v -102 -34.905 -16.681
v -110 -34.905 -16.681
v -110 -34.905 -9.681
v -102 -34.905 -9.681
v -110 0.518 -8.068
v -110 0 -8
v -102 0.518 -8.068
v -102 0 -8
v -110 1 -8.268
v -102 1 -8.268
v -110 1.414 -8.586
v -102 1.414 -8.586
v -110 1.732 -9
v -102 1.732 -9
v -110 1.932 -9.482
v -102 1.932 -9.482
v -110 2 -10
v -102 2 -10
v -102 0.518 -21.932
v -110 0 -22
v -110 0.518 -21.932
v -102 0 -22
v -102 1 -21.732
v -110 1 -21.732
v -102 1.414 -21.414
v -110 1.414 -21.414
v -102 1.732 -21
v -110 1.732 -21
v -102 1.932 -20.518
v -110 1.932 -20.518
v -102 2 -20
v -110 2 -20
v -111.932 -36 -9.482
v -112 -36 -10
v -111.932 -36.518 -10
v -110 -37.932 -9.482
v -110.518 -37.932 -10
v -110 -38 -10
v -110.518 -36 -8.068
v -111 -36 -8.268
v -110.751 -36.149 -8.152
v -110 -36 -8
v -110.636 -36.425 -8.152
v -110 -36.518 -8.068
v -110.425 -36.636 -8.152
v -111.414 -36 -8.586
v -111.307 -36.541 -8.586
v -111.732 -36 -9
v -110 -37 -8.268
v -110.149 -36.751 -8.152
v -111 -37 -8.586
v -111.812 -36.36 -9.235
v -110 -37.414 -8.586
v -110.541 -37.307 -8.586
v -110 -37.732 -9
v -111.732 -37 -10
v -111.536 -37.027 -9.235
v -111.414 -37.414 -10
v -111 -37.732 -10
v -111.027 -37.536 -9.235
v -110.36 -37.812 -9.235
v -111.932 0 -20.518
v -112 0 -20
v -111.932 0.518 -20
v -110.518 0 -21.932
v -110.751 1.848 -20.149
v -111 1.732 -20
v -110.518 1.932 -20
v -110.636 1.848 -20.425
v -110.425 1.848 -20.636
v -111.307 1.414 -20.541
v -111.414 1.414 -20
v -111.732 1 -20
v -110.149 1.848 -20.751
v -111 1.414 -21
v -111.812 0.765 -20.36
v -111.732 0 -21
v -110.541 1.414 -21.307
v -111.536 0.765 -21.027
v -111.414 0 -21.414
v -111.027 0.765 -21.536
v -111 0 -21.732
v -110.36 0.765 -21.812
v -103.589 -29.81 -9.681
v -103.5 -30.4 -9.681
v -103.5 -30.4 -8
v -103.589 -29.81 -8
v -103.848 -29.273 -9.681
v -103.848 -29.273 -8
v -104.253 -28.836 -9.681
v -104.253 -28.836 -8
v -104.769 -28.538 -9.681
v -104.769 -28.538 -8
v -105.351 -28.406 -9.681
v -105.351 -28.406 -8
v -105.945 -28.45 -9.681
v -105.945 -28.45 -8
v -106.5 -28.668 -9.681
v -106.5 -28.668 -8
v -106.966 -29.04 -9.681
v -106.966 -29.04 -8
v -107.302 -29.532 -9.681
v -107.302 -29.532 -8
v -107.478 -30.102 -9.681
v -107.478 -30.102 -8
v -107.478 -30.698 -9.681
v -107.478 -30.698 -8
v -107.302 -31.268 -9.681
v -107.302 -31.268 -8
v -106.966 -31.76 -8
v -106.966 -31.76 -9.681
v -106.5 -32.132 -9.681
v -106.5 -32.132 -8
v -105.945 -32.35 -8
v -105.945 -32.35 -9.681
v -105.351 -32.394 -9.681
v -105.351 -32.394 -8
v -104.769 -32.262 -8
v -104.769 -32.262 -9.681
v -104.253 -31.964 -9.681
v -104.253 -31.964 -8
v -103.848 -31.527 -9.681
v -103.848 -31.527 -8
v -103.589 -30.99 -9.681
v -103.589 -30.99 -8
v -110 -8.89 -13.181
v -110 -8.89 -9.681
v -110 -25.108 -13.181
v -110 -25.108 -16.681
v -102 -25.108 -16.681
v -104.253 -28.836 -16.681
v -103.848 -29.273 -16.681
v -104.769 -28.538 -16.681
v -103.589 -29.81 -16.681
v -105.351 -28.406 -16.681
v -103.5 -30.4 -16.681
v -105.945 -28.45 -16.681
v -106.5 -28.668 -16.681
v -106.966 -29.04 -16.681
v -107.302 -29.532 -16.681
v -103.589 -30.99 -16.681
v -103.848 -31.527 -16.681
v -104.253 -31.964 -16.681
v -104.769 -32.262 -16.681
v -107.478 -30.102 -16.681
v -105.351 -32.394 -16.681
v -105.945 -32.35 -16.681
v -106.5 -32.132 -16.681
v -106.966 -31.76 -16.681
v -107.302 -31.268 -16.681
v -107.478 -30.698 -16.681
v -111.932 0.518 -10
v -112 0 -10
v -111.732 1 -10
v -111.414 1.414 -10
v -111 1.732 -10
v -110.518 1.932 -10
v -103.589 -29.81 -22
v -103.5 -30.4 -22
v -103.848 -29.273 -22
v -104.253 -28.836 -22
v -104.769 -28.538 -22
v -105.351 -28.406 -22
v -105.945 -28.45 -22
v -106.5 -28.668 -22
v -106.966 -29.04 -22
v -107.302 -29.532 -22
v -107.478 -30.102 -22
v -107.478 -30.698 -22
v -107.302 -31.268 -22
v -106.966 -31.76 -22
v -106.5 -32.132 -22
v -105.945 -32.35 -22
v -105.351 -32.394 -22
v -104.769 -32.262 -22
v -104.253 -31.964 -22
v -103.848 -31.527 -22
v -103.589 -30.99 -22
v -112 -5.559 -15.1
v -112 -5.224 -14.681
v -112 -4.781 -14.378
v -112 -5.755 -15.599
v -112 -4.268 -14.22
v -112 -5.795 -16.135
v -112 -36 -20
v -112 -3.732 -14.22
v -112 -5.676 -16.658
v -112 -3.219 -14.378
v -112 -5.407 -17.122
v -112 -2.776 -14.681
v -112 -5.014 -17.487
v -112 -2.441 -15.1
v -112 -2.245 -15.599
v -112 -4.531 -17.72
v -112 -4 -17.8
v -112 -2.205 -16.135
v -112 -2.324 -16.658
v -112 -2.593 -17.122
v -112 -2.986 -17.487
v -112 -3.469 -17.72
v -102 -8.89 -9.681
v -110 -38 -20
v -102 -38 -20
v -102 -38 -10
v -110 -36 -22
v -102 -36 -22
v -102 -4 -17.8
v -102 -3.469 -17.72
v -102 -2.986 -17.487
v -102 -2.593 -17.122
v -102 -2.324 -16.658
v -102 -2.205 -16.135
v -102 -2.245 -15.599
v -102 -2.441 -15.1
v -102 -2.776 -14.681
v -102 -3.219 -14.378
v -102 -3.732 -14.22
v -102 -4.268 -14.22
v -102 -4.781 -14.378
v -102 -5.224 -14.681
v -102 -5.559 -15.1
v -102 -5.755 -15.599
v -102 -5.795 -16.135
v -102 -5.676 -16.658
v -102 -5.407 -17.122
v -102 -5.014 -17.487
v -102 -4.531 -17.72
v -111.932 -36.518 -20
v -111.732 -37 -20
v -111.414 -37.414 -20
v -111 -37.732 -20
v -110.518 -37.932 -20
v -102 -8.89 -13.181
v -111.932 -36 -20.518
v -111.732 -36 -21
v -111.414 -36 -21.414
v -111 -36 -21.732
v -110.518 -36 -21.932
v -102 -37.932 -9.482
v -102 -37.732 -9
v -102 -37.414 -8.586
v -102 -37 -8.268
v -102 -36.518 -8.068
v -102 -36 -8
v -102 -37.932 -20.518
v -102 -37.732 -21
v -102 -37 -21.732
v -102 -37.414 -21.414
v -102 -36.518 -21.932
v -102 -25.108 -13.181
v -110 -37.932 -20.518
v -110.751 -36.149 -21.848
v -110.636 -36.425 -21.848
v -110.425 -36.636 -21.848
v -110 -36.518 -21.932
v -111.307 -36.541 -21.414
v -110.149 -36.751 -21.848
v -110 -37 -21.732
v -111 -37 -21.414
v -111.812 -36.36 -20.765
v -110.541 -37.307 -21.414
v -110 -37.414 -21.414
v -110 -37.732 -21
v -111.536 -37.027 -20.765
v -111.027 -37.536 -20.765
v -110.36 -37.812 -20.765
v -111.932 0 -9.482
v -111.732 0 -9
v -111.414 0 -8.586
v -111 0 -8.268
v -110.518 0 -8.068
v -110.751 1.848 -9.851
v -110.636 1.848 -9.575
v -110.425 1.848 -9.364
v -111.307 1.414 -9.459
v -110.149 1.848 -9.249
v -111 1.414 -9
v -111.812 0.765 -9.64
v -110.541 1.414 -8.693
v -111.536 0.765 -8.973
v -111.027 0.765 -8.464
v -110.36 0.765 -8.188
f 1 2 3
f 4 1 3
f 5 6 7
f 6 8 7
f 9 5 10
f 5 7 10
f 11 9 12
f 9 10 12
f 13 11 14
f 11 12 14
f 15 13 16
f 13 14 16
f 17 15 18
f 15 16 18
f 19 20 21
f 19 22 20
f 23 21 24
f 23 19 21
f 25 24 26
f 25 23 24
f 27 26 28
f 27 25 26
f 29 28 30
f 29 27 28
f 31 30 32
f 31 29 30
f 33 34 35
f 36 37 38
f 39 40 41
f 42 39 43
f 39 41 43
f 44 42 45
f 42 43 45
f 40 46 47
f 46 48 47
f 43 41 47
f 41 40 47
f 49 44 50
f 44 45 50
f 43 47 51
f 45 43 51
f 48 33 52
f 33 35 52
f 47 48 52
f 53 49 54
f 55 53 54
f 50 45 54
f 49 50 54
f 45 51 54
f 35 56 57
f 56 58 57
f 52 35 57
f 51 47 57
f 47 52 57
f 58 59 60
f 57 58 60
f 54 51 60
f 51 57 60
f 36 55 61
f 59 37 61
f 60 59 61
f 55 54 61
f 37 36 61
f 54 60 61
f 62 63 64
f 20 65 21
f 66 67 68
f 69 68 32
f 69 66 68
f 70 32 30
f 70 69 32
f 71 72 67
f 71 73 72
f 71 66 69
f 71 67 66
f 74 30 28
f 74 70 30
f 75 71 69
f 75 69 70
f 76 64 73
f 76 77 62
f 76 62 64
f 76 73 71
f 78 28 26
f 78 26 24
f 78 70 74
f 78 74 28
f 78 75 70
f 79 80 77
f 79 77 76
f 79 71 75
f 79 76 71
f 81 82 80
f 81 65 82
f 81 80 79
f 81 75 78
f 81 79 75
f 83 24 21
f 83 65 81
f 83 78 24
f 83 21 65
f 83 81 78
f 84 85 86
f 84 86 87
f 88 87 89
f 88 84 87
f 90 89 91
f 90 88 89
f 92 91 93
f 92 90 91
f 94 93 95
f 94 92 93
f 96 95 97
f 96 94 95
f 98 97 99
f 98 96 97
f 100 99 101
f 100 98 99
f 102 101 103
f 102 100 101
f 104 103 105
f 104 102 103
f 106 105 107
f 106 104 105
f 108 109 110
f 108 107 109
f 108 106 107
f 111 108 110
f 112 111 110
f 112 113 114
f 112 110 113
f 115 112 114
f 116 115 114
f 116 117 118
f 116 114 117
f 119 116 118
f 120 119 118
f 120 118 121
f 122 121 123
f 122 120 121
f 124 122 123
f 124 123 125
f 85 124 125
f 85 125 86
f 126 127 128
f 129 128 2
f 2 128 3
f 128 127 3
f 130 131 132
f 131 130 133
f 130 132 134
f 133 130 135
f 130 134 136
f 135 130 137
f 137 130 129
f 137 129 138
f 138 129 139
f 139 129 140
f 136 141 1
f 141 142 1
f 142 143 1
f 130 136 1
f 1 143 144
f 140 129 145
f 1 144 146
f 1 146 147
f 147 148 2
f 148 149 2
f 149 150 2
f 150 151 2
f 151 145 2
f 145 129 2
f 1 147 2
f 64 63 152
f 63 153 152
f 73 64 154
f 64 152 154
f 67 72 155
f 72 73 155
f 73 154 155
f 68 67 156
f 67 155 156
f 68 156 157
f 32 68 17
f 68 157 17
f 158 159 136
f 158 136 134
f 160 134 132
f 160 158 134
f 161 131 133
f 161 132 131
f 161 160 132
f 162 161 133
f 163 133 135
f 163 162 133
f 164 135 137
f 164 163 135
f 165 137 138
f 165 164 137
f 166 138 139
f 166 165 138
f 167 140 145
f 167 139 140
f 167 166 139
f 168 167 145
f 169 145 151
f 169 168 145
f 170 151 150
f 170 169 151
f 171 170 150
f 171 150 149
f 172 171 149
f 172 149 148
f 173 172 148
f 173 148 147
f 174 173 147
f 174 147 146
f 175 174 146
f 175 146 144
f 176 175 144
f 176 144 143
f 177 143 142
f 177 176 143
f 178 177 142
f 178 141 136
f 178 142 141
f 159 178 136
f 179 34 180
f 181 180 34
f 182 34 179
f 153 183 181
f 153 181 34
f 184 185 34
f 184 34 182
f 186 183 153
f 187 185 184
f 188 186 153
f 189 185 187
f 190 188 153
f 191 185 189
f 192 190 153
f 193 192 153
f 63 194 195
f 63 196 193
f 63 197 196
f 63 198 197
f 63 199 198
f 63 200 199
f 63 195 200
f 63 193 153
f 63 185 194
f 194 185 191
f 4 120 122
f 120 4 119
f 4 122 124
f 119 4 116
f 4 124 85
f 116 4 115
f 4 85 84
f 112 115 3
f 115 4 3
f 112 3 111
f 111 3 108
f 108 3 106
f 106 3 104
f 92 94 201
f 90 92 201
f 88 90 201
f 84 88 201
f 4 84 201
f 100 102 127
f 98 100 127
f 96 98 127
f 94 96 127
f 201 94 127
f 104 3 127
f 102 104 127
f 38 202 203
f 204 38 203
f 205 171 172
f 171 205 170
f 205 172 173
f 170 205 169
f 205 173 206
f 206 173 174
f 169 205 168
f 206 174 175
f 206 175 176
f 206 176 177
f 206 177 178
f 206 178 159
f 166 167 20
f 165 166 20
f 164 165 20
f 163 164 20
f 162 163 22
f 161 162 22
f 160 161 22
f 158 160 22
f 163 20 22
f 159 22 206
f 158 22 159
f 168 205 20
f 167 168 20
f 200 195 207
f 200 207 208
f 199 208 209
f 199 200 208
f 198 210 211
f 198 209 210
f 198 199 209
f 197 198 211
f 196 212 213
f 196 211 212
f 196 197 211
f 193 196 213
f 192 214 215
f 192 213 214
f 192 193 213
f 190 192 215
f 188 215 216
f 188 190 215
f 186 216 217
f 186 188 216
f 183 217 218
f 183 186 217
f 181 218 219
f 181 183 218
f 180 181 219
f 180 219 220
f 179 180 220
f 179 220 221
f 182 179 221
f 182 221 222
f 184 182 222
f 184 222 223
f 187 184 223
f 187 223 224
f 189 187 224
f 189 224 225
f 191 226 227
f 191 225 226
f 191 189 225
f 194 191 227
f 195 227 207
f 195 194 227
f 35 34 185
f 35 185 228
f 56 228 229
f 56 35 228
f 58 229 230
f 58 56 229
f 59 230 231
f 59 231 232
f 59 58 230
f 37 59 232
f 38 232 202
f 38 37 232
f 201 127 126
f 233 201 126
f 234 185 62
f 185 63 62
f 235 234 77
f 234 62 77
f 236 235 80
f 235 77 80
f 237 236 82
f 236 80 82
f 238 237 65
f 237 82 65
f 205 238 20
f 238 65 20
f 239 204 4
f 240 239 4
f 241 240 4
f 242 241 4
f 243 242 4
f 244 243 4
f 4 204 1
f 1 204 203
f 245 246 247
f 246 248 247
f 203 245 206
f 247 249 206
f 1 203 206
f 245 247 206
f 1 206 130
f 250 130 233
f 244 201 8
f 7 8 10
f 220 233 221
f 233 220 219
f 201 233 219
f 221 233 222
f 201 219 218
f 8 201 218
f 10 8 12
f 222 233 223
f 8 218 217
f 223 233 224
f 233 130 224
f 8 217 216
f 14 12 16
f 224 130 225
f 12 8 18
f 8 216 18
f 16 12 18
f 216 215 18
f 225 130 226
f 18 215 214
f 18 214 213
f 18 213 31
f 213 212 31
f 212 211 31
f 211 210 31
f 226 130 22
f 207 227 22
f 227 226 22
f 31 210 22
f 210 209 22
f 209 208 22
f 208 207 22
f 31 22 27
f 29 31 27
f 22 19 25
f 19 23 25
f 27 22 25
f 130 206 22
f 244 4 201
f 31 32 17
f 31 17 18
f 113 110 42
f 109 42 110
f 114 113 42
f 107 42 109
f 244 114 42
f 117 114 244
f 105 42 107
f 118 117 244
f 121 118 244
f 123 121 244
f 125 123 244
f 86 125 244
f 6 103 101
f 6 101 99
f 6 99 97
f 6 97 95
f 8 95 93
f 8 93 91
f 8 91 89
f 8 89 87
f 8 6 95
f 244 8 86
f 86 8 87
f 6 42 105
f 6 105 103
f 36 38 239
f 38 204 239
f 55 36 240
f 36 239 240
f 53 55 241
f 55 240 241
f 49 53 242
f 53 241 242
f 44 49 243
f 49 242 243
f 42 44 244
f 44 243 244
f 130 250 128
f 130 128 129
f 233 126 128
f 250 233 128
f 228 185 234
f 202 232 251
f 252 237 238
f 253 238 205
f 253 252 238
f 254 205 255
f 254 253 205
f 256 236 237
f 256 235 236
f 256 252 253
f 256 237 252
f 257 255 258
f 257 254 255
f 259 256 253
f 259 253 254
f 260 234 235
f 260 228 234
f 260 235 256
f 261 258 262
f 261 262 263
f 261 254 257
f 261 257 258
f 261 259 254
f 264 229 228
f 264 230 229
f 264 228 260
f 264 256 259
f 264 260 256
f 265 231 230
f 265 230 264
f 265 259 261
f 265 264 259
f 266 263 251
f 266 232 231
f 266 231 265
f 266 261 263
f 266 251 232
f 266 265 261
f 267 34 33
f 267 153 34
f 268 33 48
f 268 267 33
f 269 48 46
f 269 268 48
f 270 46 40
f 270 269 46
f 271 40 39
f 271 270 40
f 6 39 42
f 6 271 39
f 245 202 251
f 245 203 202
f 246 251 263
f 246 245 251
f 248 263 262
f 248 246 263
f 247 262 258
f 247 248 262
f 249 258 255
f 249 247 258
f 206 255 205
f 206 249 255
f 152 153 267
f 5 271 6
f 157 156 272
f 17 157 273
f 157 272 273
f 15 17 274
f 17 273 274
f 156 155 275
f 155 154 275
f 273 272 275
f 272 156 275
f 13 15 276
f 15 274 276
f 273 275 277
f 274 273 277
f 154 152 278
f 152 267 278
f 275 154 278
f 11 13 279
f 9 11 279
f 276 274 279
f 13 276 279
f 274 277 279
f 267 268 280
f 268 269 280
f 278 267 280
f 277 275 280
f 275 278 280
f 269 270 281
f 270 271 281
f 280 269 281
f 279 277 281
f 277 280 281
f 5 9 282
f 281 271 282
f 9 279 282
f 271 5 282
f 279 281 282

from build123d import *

# Parameters (mm, degrees)
CYLINDER009_R     = 2
CYLINDER009_DEPTH = 50
PAD001_DEPTH      = 30
CYLINDER008_R     = 1.8
CYLINDER008_DEPTH = 50
BOX006_W          = 10
BOX006_H          = 40
BOX006_DEPTH      = 14
FILLET_R          = 2


with BuildPart() as cylinder009:
    # Cylinder009 → Cylinder009 (new body)
    with BuildSketch(Plane(origin=(-105.5, -30.4, -37), x_dir=(1, 0, 0), z_dir=(0, 0, 1))):
        Circle(CYLINDER009_R)
    extrude(amount=CYLINDER009_DEPTH)


with BuildPart() as body001:
    # Sketch001 → Pad001 (new body)
    with BuildSketch(Plane.YZ):
        Polygon((-34.905251, -9.681131), (-8.889799, -9.681131), (-8.889799, -13.181131), (-25.107943, -13.181131), (-25.107943, -16.681131), (-34.905251, -16.681131), align=None)
    extrude(amount=PAD001_DEPTH)


with BuildPart() as body001_1:
    # Body001 placement: moved
    add(body001.part.moved(Location((-110, 0, 0))))


with BuildPart() as fusion001005:
    # Cylinder008 → Cylinder008 (new body)
    with BuildSketch(Plane(origin=(-143, -4, -16), x_dir=(0, 0, -1), z_dir=(1, 0, 0))):
        Circle(CYLINDER008_R)
    extrude(amount=CYLINDER008_DEPTH)

    # Fusion001005: union Cylinder009, Body001
    add(cylinder009.part)
    add(body001_1.part)


with BuildPart() as fillet_body:
    # Box006 → Box006 (new body)
    with BuildSketch(Plane(origin=(-112, -38, -22), x_dir=(1, 0, 0), z_dir=(0, 0, 1))):
        with Locations((5, 20)):
            Rectangle(BOX006_W, BOX006_H)
    extrude(amount=BOX006_DEPTH)

    # Cut009: cut Fusion001005
    add(fusion001005.part, mode=Mode.SUBTRACT)

    # Fillet
    fillet_edges = [fillet_body.edges().sort_by_distance(p)[0] for p in [
        (-112, -38, -15),
        (-112, -18, -8),
        (-112, -18, -22),
        (-112, 2, -15),
        (-107, -38, -22),
        (-107, -38, -8),
        (-107, 2, -8),
        (-107, 2, -22),
    ]]
    fillet(fillet_edges, radius=FILLET_R)


solid = fillet_body.part
